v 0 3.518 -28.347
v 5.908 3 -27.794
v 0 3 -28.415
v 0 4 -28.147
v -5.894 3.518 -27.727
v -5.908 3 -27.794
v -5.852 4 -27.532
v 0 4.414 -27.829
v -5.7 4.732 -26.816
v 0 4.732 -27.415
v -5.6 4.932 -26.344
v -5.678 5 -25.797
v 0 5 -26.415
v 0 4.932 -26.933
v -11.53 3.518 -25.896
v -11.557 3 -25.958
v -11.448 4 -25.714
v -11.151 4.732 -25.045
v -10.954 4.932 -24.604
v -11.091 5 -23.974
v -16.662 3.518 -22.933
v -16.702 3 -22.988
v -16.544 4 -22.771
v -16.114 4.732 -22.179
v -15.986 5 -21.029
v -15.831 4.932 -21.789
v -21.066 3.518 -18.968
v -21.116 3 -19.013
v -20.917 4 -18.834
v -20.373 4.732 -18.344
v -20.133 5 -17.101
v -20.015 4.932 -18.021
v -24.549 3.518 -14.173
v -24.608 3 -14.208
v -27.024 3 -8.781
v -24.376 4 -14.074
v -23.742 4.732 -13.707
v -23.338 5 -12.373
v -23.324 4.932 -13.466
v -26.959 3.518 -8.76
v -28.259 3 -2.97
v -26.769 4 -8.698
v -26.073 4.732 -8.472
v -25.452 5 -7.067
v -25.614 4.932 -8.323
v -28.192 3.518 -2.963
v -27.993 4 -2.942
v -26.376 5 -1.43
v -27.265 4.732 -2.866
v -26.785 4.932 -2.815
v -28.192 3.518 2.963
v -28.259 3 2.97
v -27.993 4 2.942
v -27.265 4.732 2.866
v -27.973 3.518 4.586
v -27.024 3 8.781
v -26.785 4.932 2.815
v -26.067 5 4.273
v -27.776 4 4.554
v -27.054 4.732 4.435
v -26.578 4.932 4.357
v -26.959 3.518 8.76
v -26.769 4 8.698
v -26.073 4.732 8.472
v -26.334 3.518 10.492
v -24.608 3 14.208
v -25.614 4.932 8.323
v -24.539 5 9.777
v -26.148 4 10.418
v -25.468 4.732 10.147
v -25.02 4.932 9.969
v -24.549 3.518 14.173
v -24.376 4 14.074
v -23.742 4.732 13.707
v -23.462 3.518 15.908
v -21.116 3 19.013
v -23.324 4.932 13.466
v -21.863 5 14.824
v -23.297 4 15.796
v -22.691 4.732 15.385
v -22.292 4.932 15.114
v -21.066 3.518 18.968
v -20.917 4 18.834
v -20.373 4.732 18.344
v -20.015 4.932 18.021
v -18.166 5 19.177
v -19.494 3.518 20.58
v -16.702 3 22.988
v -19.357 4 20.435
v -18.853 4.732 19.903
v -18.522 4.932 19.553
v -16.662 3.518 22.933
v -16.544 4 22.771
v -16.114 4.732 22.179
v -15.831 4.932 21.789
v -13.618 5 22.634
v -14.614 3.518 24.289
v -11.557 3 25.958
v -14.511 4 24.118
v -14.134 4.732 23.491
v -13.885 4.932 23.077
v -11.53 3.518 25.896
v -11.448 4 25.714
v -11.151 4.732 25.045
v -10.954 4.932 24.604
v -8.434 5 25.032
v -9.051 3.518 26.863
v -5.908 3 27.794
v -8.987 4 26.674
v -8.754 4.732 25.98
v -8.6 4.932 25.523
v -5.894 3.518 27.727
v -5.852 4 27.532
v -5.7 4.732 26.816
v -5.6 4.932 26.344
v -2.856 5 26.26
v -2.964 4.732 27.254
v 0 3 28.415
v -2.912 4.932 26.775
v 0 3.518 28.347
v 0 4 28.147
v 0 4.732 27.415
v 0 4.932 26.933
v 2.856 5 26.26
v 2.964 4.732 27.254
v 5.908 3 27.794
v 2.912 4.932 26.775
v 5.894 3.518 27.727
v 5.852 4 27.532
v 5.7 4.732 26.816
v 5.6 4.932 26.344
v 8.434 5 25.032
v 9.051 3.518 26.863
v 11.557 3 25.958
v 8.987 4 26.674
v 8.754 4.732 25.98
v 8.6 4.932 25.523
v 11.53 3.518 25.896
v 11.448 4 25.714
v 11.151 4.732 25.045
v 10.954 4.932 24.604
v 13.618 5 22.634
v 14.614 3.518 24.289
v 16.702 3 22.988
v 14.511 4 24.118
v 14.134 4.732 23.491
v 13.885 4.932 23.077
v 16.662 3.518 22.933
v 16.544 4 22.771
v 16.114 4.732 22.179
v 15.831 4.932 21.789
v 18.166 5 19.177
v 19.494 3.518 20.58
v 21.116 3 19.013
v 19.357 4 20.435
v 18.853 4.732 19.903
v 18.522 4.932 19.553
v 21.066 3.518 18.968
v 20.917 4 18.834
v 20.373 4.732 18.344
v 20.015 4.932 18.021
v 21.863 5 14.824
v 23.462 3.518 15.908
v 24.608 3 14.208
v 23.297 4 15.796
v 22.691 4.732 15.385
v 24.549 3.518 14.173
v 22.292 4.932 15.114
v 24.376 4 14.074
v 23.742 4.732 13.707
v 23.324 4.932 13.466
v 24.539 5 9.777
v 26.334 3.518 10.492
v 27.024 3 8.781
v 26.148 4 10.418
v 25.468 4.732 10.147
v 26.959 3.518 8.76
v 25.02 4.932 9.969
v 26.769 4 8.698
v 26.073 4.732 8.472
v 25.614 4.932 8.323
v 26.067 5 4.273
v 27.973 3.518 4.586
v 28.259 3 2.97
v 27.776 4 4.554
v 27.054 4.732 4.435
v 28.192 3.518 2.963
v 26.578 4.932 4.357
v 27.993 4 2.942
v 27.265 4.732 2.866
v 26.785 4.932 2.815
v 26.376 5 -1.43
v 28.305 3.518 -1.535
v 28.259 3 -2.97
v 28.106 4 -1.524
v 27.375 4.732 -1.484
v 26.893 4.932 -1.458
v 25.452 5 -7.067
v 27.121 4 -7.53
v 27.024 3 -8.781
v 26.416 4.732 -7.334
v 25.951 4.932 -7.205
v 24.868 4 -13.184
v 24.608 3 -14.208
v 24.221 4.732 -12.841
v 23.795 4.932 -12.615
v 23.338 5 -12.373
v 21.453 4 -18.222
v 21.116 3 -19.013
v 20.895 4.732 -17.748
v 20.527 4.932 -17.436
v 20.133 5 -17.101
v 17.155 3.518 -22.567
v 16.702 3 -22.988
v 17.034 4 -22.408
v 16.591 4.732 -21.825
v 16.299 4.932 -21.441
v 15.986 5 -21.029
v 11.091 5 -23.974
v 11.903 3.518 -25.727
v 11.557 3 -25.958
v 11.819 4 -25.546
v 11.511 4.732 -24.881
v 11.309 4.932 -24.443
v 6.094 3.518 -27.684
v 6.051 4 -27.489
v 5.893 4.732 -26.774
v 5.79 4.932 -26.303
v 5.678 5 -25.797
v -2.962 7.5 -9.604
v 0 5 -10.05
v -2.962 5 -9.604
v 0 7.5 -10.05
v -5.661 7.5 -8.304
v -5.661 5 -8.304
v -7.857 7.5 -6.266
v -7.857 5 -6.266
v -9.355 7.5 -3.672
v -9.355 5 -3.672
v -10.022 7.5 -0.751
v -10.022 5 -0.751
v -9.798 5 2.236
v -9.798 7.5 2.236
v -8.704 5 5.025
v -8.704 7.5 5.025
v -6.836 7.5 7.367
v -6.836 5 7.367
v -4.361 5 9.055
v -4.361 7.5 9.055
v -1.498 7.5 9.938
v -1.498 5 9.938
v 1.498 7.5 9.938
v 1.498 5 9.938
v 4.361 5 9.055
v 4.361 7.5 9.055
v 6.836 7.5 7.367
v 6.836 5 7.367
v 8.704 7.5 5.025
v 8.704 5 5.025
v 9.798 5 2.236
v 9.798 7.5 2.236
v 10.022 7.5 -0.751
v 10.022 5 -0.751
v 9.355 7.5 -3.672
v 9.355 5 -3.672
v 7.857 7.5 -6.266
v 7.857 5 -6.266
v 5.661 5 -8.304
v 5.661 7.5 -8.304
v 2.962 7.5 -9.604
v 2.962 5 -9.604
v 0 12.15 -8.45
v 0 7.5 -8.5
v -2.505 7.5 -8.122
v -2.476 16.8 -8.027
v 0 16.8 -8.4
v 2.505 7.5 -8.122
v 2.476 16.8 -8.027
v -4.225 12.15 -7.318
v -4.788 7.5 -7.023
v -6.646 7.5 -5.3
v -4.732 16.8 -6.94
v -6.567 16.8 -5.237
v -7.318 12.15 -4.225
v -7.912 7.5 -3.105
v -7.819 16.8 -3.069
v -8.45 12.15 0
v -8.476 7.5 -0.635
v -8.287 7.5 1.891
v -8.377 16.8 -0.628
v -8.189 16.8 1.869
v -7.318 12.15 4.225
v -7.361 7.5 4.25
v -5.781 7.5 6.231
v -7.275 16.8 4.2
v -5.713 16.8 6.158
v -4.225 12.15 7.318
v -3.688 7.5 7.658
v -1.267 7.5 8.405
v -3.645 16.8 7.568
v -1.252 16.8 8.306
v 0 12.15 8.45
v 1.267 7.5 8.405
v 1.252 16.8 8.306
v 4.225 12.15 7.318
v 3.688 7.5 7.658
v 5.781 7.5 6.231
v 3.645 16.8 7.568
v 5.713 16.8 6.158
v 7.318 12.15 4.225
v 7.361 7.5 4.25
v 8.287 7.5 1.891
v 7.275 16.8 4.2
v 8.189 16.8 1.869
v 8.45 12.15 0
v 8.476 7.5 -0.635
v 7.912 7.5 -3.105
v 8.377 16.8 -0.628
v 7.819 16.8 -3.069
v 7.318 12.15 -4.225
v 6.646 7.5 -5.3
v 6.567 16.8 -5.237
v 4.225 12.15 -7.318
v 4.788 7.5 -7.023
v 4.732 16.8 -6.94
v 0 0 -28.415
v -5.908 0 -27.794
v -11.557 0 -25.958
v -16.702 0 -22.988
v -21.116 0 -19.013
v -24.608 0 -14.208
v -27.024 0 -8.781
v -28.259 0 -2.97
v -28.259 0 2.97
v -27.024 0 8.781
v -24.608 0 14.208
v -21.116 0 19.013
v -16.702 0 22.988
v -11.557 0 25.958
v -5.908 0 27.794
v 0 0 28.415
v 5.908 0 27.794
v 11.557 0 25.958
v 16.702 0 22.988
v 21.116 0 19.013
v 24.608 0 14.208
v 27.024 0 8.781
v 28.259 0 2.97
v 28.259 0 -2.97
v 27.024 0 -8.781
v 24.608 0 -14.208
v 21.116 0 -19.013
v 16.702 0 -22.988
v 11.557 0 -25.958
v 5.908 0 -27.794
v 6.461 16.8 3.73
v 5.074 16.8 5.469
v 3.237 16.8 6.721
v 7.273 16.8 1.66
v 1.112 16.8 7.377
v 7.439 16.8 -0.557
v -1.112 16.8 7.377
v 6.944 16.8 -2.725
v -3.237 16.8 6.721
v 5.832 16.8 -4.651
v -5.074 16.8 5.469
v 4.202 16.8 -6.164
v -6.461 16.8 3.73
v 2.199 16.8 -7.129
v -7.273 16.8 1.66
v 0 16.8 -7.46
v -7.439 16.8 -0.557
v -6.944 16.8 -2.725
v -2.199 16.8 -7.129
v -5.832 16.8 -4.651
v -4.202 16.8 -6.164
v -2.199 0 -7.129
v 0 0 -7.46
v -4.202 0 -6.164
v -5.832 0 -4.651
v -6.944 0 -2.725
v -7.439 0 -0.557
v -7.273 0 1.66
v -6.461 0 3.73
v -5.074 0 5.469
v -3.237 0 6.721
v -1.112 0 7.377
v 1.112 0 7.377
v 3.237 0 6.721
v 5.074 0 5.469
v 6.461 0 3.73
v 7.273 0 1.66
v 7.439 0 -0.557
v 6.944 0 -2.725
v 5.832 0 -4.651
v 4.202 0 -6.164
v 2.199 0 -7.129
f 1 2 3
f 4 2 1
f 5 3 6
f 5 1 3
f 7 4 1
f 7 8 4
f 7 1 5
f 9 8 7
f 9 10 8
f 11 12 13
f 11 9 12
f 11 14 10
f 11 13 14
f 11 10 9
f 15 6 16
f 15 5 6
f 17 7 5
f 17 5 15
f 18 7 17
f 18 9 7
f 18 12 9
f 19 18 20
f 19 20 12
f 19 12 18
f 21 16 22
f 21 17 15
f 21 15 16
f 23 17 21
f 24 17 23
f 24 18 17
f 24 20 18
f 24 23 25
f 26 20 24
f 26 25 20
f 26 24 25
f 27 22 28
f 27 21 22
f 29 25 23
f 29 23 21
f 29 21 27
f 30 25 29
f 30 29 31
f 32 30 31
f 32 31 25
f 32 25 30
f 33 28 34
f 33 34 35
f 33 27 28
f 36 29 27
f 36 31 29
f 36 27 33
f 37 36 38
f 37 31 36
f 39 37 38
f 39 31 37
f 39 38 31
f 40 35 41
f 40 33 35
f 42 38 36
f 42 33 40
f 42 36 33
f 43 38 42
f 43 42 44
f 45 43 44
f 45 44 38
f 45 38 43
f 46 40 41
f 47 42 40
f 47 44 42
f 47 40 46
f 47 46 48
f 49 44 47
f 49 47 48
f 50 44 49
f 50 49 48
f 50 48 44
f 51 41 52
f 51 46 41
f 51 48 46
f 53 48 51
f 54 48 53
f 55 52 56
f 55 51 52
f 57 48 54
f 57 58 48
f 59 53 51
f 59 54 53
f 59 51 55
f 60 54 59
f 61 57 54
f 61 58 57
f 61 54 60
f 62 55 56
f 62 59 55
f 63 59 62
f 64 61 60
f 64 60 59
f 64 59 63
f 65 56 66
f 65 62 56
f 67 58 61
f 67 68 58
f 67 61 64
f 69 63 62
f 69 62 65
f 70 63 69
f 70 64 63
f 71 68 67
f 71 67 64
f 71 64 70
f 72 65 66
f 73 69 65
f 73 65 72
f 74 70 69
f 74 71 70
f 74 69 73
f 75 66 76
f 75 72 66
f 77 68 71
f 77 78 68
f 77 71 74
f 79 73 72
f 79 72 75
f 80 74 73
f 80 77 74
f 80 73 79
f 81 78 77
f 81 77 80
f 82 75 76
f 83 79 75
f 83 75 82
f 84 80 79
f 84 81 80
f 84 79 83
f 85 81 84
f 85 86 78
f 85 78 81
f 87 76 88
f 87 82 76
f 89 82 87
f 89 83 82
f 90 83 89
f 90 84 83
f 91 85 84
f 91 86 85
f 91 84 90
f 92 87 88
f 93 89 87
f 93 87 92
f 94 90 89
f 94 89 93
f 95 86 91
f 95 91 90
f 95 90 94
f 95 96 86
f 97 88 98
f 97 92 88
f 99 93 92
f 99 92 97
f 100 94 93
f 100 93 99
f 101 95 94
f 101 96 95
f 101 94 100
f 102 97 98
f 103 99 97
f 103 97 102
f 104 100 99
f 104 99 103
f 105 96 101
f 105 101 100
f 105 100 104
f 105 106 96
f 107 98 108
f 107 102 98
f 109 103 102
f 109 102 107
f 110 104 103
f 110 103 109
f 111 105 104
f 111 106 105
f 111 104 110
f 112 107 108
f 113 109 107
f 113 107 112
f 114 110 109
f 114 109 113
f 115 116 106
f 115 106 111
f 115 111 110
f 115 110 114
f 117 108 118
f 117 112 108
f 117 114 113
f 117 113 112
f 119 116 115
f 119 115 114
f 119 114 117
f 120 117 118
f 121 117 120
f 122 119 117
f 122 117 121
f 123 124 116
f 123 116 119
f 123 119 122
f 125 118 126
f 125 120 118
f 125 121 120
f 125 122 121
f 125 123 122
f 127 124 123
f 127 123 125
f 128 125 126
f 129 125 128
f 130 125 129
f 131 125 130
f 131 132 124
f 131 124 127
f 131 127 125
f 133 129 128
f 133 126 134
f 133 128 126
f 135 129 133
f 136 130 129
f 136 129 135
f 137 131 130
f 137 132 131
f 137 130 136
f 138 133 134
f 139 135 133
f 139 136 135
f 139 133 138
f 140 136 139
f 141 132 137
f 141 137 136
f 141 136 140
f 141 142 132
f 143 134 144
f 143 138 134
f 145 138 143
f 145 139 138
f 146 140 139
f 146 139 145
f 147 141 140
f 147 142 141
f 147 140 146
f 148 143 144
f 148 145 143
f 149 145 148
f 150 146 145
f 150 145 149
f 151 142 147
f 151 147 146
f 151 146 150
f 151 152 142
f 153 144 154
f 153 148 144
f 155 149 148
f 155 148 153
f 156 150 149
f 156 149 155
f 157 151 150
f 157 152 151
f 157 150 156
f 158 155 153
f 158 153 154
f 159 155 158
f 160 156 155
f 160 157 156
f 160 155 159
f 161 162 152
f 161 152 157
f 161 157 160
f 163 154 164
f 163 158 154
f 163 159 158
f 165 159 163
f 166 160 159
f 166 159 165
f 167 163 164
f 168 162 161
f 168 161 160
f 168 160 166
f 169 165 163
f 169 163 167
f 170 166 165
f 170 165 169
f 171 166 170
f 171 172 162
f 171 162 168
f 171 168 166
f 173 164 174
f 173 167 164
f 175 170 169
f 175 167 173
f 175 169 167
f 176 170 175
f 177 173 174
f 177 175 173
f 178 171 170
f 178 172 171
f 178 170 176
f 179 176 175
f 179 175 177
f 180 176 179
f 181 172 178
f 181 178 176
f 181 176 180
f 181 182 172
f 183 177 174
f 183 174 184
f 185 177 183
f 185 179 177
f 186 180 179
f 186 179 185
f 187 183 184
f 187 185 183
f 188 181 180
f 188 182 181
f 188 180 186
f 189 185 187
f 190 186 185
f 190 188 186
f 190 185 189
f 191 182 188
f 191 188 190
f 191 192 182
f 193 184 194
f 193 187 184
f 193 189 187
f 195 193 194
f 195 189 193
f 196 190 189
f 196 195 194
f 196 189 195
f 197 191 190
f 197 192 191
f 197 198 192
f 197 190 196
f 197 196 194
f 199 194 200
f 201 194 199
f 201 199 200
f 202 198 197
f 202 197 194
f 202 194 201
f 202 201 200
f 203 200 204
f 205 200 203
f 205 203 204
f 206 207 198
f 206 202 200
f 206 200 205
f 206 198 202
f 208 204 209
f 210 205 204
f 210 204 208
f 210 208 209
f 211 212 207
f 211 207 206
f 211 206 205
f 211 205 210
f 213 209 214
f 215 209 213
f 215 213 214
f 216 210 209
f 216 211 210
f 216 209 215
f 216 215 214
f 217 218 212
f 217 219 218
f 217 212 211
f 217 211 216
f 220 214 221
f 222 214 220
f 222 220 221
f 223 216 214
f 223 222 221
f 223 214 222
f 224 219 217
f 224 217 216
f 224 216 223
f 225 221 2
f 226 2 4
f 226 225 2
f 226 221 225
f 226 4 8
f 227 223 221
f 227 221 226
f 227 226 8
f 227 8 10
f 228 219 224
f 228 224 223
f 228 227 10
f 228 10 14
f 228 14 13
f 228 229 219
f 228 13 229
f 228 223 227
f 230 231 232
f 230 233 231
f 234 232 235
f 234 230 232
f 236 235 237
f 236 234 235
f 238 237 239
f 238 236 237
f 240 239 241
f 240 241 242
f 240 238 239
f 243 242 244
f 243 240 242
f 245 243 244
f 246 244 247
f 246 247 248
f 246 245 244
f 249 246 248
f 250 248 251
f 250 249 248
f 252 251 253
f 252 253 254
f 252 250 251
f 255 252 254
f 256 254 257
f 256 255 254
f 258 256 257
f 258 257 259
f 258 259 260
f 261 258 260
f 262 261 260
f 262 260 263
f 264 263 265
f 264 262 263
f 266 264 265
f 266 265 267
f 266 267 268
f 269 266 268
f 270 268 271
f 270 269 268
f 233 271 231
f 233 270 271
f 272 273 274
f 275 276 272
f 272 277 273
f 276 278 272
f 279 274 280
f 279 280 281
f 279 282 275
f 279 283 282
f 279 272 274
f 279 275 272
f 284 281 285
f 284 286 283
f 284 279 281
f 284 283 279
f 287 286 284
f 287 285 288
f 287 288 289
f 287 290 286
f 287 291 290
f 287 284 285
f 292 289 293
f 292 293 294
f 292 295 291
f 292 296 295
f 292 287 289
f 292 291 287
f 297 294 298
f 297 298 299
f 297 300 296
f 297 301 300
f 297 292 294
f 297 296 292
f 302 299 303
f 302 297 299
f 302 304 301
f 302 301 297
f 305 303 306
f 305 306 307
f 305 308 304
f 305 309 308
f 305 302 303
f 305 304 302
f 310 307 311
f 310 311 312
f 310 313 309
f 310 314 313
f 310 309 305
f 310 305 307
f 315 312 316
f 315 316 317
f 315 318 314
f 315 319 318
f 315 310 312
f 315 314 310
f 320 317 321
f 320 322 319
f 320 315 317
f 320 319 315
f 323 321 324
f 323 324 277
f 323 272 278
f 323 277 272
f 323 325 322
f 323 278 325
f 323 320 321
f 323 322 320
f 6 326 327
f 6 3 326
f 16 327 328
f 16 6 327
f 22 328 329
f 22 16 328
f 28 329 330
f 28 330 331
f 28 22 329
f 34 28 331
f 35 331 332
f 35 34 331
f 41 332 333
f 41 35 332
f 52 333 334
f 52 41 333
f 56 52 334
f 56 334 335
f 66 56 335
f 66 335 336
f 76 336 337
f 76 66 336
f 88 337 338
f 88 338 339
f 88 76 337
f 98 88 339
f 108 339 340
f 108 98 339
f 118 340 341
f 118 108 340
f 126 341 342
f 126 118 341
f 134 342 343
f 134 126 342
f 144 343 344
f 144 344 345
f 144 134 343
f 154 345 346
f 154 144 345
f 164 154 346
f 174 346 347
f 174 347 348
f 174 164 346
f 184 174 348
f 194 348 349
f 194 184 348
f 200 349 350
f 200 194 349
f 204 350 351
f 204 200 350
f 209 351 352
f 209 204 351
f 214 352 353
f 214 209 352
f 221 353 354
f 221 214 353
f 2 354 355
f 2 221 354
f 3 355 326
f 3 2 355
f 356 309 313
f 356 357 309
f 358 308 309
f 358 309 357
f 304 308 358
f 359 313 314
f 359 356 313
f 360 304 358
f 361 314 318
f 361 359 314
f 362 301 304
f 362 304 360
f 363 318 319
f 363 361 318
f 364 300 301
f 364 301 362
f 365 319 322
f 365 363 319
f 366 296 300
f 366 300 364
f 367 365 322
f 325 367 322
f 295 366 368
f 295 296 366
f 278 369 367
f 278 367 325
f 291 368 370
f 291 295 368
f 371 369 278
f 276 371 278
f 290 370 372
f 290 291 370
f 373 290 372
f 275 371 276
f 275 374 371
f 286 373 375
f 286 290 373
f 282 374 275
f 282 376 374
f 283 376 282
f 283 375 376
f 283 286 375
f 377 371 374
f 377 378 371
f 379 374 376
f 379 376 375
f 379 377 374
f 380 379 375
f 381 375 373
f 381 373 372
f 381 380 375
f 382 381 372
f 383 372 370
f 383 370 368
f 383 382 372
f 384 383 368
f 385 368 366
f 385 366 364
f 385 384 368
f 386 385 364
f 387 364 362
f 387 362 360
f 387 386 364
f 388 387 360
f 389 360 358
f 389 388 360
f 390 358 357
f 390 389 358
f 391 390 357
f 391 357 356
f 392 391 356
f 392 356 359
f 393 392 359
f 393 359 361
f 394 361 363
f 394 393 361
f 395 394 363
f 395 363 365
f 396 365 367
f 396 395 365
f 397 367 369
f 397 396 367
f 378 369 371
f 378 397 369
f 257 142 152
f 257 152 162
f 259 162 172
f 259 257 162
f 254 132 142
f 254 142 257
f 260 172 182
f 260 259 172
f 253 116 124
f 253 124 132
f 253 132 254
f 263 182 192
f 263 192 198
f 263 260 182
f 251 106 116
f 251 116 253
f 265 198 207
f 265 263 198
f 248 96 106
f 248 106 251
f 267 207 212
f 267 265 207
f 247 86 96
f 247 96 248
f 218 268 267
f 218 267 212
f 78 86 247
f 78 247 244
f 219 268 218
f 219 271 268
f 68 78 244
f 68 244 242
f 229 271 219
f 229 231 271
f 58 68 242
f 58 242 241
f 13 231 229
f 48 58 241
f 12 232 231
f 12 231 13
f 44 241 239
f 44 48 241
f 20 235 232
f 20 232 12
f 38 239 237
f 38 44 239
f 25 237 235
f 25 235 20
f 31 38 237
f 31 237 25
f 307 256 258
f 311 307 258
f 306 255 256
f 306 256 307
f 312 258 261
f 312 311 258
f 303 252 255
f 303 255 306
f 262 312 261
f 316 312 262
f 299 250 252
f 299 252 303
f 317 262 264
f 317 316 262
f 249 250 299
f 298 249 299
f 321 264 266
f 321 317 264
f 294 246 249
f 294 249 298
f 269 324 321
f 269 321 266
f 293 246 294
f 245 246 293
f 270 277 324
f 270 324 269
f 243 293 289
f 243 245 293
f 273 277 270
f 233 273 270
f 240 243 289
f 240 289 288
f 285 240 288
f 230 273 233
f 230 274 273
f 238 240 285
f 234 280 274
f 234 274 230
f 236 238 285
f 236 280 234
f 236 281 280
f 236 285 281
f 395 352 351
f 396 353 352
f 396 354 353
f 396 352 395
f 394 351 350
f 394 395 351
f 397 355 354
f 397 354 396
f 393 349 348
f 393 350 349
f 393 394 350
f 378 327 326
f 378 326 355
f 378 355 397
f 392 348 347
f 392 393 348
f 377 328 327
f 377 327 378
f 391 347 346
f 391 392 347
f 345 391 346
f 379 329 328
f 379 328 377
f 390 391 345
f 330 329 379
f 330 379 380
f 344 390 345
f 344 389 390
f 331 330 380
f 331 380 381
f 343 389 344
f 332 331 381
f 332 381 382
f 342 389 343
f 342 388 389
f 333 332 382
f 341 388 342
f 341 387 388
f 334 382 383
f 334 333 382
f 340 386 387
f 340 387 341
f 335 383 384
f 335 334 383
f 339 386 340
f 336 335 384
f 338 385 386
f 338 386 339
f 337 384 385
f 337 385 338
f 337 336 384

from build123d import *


with BuildPart() as part:
    # Sketch1 → Revolve1 (revolve)
    with BuildSketch(Plane(origin=(0, 0, 0), x_dir=(0, 0, -1), z_dir=(1, 0, 0)), mode=Mode.PRIVATE) as revolve1_sk:
        with BuildLine():
            Line((-7.46, 0), (-28.415, 0))
            Line((-28.415, 0), (-28.415, 3))
            ThreePointArc((-28.415, 3), (-27.829213562, 4.414213562), (-26.415, 5))
            Line((-26.415, 5), (-10.05, 5))
            Line((-10.05, 5), (-10.05, 7.5))
            Line((-10.05, 7.5), (-8.5, 7.5))
            Line((-8.5, 7.5), (-8.4, 16.8))
            Line((-8.4, 16.8), (-7.46, 16.8))
            Line((-7.46, 16.8), (-7.46, 0))
        make_face()
    revolve(revolve1_sk.sketch.rotate(Axis((0, 0, 0), (0, 1, 0)), 180), axis=Axis((0, 0, 0), (0, 1, 0)))


solid = part.part
